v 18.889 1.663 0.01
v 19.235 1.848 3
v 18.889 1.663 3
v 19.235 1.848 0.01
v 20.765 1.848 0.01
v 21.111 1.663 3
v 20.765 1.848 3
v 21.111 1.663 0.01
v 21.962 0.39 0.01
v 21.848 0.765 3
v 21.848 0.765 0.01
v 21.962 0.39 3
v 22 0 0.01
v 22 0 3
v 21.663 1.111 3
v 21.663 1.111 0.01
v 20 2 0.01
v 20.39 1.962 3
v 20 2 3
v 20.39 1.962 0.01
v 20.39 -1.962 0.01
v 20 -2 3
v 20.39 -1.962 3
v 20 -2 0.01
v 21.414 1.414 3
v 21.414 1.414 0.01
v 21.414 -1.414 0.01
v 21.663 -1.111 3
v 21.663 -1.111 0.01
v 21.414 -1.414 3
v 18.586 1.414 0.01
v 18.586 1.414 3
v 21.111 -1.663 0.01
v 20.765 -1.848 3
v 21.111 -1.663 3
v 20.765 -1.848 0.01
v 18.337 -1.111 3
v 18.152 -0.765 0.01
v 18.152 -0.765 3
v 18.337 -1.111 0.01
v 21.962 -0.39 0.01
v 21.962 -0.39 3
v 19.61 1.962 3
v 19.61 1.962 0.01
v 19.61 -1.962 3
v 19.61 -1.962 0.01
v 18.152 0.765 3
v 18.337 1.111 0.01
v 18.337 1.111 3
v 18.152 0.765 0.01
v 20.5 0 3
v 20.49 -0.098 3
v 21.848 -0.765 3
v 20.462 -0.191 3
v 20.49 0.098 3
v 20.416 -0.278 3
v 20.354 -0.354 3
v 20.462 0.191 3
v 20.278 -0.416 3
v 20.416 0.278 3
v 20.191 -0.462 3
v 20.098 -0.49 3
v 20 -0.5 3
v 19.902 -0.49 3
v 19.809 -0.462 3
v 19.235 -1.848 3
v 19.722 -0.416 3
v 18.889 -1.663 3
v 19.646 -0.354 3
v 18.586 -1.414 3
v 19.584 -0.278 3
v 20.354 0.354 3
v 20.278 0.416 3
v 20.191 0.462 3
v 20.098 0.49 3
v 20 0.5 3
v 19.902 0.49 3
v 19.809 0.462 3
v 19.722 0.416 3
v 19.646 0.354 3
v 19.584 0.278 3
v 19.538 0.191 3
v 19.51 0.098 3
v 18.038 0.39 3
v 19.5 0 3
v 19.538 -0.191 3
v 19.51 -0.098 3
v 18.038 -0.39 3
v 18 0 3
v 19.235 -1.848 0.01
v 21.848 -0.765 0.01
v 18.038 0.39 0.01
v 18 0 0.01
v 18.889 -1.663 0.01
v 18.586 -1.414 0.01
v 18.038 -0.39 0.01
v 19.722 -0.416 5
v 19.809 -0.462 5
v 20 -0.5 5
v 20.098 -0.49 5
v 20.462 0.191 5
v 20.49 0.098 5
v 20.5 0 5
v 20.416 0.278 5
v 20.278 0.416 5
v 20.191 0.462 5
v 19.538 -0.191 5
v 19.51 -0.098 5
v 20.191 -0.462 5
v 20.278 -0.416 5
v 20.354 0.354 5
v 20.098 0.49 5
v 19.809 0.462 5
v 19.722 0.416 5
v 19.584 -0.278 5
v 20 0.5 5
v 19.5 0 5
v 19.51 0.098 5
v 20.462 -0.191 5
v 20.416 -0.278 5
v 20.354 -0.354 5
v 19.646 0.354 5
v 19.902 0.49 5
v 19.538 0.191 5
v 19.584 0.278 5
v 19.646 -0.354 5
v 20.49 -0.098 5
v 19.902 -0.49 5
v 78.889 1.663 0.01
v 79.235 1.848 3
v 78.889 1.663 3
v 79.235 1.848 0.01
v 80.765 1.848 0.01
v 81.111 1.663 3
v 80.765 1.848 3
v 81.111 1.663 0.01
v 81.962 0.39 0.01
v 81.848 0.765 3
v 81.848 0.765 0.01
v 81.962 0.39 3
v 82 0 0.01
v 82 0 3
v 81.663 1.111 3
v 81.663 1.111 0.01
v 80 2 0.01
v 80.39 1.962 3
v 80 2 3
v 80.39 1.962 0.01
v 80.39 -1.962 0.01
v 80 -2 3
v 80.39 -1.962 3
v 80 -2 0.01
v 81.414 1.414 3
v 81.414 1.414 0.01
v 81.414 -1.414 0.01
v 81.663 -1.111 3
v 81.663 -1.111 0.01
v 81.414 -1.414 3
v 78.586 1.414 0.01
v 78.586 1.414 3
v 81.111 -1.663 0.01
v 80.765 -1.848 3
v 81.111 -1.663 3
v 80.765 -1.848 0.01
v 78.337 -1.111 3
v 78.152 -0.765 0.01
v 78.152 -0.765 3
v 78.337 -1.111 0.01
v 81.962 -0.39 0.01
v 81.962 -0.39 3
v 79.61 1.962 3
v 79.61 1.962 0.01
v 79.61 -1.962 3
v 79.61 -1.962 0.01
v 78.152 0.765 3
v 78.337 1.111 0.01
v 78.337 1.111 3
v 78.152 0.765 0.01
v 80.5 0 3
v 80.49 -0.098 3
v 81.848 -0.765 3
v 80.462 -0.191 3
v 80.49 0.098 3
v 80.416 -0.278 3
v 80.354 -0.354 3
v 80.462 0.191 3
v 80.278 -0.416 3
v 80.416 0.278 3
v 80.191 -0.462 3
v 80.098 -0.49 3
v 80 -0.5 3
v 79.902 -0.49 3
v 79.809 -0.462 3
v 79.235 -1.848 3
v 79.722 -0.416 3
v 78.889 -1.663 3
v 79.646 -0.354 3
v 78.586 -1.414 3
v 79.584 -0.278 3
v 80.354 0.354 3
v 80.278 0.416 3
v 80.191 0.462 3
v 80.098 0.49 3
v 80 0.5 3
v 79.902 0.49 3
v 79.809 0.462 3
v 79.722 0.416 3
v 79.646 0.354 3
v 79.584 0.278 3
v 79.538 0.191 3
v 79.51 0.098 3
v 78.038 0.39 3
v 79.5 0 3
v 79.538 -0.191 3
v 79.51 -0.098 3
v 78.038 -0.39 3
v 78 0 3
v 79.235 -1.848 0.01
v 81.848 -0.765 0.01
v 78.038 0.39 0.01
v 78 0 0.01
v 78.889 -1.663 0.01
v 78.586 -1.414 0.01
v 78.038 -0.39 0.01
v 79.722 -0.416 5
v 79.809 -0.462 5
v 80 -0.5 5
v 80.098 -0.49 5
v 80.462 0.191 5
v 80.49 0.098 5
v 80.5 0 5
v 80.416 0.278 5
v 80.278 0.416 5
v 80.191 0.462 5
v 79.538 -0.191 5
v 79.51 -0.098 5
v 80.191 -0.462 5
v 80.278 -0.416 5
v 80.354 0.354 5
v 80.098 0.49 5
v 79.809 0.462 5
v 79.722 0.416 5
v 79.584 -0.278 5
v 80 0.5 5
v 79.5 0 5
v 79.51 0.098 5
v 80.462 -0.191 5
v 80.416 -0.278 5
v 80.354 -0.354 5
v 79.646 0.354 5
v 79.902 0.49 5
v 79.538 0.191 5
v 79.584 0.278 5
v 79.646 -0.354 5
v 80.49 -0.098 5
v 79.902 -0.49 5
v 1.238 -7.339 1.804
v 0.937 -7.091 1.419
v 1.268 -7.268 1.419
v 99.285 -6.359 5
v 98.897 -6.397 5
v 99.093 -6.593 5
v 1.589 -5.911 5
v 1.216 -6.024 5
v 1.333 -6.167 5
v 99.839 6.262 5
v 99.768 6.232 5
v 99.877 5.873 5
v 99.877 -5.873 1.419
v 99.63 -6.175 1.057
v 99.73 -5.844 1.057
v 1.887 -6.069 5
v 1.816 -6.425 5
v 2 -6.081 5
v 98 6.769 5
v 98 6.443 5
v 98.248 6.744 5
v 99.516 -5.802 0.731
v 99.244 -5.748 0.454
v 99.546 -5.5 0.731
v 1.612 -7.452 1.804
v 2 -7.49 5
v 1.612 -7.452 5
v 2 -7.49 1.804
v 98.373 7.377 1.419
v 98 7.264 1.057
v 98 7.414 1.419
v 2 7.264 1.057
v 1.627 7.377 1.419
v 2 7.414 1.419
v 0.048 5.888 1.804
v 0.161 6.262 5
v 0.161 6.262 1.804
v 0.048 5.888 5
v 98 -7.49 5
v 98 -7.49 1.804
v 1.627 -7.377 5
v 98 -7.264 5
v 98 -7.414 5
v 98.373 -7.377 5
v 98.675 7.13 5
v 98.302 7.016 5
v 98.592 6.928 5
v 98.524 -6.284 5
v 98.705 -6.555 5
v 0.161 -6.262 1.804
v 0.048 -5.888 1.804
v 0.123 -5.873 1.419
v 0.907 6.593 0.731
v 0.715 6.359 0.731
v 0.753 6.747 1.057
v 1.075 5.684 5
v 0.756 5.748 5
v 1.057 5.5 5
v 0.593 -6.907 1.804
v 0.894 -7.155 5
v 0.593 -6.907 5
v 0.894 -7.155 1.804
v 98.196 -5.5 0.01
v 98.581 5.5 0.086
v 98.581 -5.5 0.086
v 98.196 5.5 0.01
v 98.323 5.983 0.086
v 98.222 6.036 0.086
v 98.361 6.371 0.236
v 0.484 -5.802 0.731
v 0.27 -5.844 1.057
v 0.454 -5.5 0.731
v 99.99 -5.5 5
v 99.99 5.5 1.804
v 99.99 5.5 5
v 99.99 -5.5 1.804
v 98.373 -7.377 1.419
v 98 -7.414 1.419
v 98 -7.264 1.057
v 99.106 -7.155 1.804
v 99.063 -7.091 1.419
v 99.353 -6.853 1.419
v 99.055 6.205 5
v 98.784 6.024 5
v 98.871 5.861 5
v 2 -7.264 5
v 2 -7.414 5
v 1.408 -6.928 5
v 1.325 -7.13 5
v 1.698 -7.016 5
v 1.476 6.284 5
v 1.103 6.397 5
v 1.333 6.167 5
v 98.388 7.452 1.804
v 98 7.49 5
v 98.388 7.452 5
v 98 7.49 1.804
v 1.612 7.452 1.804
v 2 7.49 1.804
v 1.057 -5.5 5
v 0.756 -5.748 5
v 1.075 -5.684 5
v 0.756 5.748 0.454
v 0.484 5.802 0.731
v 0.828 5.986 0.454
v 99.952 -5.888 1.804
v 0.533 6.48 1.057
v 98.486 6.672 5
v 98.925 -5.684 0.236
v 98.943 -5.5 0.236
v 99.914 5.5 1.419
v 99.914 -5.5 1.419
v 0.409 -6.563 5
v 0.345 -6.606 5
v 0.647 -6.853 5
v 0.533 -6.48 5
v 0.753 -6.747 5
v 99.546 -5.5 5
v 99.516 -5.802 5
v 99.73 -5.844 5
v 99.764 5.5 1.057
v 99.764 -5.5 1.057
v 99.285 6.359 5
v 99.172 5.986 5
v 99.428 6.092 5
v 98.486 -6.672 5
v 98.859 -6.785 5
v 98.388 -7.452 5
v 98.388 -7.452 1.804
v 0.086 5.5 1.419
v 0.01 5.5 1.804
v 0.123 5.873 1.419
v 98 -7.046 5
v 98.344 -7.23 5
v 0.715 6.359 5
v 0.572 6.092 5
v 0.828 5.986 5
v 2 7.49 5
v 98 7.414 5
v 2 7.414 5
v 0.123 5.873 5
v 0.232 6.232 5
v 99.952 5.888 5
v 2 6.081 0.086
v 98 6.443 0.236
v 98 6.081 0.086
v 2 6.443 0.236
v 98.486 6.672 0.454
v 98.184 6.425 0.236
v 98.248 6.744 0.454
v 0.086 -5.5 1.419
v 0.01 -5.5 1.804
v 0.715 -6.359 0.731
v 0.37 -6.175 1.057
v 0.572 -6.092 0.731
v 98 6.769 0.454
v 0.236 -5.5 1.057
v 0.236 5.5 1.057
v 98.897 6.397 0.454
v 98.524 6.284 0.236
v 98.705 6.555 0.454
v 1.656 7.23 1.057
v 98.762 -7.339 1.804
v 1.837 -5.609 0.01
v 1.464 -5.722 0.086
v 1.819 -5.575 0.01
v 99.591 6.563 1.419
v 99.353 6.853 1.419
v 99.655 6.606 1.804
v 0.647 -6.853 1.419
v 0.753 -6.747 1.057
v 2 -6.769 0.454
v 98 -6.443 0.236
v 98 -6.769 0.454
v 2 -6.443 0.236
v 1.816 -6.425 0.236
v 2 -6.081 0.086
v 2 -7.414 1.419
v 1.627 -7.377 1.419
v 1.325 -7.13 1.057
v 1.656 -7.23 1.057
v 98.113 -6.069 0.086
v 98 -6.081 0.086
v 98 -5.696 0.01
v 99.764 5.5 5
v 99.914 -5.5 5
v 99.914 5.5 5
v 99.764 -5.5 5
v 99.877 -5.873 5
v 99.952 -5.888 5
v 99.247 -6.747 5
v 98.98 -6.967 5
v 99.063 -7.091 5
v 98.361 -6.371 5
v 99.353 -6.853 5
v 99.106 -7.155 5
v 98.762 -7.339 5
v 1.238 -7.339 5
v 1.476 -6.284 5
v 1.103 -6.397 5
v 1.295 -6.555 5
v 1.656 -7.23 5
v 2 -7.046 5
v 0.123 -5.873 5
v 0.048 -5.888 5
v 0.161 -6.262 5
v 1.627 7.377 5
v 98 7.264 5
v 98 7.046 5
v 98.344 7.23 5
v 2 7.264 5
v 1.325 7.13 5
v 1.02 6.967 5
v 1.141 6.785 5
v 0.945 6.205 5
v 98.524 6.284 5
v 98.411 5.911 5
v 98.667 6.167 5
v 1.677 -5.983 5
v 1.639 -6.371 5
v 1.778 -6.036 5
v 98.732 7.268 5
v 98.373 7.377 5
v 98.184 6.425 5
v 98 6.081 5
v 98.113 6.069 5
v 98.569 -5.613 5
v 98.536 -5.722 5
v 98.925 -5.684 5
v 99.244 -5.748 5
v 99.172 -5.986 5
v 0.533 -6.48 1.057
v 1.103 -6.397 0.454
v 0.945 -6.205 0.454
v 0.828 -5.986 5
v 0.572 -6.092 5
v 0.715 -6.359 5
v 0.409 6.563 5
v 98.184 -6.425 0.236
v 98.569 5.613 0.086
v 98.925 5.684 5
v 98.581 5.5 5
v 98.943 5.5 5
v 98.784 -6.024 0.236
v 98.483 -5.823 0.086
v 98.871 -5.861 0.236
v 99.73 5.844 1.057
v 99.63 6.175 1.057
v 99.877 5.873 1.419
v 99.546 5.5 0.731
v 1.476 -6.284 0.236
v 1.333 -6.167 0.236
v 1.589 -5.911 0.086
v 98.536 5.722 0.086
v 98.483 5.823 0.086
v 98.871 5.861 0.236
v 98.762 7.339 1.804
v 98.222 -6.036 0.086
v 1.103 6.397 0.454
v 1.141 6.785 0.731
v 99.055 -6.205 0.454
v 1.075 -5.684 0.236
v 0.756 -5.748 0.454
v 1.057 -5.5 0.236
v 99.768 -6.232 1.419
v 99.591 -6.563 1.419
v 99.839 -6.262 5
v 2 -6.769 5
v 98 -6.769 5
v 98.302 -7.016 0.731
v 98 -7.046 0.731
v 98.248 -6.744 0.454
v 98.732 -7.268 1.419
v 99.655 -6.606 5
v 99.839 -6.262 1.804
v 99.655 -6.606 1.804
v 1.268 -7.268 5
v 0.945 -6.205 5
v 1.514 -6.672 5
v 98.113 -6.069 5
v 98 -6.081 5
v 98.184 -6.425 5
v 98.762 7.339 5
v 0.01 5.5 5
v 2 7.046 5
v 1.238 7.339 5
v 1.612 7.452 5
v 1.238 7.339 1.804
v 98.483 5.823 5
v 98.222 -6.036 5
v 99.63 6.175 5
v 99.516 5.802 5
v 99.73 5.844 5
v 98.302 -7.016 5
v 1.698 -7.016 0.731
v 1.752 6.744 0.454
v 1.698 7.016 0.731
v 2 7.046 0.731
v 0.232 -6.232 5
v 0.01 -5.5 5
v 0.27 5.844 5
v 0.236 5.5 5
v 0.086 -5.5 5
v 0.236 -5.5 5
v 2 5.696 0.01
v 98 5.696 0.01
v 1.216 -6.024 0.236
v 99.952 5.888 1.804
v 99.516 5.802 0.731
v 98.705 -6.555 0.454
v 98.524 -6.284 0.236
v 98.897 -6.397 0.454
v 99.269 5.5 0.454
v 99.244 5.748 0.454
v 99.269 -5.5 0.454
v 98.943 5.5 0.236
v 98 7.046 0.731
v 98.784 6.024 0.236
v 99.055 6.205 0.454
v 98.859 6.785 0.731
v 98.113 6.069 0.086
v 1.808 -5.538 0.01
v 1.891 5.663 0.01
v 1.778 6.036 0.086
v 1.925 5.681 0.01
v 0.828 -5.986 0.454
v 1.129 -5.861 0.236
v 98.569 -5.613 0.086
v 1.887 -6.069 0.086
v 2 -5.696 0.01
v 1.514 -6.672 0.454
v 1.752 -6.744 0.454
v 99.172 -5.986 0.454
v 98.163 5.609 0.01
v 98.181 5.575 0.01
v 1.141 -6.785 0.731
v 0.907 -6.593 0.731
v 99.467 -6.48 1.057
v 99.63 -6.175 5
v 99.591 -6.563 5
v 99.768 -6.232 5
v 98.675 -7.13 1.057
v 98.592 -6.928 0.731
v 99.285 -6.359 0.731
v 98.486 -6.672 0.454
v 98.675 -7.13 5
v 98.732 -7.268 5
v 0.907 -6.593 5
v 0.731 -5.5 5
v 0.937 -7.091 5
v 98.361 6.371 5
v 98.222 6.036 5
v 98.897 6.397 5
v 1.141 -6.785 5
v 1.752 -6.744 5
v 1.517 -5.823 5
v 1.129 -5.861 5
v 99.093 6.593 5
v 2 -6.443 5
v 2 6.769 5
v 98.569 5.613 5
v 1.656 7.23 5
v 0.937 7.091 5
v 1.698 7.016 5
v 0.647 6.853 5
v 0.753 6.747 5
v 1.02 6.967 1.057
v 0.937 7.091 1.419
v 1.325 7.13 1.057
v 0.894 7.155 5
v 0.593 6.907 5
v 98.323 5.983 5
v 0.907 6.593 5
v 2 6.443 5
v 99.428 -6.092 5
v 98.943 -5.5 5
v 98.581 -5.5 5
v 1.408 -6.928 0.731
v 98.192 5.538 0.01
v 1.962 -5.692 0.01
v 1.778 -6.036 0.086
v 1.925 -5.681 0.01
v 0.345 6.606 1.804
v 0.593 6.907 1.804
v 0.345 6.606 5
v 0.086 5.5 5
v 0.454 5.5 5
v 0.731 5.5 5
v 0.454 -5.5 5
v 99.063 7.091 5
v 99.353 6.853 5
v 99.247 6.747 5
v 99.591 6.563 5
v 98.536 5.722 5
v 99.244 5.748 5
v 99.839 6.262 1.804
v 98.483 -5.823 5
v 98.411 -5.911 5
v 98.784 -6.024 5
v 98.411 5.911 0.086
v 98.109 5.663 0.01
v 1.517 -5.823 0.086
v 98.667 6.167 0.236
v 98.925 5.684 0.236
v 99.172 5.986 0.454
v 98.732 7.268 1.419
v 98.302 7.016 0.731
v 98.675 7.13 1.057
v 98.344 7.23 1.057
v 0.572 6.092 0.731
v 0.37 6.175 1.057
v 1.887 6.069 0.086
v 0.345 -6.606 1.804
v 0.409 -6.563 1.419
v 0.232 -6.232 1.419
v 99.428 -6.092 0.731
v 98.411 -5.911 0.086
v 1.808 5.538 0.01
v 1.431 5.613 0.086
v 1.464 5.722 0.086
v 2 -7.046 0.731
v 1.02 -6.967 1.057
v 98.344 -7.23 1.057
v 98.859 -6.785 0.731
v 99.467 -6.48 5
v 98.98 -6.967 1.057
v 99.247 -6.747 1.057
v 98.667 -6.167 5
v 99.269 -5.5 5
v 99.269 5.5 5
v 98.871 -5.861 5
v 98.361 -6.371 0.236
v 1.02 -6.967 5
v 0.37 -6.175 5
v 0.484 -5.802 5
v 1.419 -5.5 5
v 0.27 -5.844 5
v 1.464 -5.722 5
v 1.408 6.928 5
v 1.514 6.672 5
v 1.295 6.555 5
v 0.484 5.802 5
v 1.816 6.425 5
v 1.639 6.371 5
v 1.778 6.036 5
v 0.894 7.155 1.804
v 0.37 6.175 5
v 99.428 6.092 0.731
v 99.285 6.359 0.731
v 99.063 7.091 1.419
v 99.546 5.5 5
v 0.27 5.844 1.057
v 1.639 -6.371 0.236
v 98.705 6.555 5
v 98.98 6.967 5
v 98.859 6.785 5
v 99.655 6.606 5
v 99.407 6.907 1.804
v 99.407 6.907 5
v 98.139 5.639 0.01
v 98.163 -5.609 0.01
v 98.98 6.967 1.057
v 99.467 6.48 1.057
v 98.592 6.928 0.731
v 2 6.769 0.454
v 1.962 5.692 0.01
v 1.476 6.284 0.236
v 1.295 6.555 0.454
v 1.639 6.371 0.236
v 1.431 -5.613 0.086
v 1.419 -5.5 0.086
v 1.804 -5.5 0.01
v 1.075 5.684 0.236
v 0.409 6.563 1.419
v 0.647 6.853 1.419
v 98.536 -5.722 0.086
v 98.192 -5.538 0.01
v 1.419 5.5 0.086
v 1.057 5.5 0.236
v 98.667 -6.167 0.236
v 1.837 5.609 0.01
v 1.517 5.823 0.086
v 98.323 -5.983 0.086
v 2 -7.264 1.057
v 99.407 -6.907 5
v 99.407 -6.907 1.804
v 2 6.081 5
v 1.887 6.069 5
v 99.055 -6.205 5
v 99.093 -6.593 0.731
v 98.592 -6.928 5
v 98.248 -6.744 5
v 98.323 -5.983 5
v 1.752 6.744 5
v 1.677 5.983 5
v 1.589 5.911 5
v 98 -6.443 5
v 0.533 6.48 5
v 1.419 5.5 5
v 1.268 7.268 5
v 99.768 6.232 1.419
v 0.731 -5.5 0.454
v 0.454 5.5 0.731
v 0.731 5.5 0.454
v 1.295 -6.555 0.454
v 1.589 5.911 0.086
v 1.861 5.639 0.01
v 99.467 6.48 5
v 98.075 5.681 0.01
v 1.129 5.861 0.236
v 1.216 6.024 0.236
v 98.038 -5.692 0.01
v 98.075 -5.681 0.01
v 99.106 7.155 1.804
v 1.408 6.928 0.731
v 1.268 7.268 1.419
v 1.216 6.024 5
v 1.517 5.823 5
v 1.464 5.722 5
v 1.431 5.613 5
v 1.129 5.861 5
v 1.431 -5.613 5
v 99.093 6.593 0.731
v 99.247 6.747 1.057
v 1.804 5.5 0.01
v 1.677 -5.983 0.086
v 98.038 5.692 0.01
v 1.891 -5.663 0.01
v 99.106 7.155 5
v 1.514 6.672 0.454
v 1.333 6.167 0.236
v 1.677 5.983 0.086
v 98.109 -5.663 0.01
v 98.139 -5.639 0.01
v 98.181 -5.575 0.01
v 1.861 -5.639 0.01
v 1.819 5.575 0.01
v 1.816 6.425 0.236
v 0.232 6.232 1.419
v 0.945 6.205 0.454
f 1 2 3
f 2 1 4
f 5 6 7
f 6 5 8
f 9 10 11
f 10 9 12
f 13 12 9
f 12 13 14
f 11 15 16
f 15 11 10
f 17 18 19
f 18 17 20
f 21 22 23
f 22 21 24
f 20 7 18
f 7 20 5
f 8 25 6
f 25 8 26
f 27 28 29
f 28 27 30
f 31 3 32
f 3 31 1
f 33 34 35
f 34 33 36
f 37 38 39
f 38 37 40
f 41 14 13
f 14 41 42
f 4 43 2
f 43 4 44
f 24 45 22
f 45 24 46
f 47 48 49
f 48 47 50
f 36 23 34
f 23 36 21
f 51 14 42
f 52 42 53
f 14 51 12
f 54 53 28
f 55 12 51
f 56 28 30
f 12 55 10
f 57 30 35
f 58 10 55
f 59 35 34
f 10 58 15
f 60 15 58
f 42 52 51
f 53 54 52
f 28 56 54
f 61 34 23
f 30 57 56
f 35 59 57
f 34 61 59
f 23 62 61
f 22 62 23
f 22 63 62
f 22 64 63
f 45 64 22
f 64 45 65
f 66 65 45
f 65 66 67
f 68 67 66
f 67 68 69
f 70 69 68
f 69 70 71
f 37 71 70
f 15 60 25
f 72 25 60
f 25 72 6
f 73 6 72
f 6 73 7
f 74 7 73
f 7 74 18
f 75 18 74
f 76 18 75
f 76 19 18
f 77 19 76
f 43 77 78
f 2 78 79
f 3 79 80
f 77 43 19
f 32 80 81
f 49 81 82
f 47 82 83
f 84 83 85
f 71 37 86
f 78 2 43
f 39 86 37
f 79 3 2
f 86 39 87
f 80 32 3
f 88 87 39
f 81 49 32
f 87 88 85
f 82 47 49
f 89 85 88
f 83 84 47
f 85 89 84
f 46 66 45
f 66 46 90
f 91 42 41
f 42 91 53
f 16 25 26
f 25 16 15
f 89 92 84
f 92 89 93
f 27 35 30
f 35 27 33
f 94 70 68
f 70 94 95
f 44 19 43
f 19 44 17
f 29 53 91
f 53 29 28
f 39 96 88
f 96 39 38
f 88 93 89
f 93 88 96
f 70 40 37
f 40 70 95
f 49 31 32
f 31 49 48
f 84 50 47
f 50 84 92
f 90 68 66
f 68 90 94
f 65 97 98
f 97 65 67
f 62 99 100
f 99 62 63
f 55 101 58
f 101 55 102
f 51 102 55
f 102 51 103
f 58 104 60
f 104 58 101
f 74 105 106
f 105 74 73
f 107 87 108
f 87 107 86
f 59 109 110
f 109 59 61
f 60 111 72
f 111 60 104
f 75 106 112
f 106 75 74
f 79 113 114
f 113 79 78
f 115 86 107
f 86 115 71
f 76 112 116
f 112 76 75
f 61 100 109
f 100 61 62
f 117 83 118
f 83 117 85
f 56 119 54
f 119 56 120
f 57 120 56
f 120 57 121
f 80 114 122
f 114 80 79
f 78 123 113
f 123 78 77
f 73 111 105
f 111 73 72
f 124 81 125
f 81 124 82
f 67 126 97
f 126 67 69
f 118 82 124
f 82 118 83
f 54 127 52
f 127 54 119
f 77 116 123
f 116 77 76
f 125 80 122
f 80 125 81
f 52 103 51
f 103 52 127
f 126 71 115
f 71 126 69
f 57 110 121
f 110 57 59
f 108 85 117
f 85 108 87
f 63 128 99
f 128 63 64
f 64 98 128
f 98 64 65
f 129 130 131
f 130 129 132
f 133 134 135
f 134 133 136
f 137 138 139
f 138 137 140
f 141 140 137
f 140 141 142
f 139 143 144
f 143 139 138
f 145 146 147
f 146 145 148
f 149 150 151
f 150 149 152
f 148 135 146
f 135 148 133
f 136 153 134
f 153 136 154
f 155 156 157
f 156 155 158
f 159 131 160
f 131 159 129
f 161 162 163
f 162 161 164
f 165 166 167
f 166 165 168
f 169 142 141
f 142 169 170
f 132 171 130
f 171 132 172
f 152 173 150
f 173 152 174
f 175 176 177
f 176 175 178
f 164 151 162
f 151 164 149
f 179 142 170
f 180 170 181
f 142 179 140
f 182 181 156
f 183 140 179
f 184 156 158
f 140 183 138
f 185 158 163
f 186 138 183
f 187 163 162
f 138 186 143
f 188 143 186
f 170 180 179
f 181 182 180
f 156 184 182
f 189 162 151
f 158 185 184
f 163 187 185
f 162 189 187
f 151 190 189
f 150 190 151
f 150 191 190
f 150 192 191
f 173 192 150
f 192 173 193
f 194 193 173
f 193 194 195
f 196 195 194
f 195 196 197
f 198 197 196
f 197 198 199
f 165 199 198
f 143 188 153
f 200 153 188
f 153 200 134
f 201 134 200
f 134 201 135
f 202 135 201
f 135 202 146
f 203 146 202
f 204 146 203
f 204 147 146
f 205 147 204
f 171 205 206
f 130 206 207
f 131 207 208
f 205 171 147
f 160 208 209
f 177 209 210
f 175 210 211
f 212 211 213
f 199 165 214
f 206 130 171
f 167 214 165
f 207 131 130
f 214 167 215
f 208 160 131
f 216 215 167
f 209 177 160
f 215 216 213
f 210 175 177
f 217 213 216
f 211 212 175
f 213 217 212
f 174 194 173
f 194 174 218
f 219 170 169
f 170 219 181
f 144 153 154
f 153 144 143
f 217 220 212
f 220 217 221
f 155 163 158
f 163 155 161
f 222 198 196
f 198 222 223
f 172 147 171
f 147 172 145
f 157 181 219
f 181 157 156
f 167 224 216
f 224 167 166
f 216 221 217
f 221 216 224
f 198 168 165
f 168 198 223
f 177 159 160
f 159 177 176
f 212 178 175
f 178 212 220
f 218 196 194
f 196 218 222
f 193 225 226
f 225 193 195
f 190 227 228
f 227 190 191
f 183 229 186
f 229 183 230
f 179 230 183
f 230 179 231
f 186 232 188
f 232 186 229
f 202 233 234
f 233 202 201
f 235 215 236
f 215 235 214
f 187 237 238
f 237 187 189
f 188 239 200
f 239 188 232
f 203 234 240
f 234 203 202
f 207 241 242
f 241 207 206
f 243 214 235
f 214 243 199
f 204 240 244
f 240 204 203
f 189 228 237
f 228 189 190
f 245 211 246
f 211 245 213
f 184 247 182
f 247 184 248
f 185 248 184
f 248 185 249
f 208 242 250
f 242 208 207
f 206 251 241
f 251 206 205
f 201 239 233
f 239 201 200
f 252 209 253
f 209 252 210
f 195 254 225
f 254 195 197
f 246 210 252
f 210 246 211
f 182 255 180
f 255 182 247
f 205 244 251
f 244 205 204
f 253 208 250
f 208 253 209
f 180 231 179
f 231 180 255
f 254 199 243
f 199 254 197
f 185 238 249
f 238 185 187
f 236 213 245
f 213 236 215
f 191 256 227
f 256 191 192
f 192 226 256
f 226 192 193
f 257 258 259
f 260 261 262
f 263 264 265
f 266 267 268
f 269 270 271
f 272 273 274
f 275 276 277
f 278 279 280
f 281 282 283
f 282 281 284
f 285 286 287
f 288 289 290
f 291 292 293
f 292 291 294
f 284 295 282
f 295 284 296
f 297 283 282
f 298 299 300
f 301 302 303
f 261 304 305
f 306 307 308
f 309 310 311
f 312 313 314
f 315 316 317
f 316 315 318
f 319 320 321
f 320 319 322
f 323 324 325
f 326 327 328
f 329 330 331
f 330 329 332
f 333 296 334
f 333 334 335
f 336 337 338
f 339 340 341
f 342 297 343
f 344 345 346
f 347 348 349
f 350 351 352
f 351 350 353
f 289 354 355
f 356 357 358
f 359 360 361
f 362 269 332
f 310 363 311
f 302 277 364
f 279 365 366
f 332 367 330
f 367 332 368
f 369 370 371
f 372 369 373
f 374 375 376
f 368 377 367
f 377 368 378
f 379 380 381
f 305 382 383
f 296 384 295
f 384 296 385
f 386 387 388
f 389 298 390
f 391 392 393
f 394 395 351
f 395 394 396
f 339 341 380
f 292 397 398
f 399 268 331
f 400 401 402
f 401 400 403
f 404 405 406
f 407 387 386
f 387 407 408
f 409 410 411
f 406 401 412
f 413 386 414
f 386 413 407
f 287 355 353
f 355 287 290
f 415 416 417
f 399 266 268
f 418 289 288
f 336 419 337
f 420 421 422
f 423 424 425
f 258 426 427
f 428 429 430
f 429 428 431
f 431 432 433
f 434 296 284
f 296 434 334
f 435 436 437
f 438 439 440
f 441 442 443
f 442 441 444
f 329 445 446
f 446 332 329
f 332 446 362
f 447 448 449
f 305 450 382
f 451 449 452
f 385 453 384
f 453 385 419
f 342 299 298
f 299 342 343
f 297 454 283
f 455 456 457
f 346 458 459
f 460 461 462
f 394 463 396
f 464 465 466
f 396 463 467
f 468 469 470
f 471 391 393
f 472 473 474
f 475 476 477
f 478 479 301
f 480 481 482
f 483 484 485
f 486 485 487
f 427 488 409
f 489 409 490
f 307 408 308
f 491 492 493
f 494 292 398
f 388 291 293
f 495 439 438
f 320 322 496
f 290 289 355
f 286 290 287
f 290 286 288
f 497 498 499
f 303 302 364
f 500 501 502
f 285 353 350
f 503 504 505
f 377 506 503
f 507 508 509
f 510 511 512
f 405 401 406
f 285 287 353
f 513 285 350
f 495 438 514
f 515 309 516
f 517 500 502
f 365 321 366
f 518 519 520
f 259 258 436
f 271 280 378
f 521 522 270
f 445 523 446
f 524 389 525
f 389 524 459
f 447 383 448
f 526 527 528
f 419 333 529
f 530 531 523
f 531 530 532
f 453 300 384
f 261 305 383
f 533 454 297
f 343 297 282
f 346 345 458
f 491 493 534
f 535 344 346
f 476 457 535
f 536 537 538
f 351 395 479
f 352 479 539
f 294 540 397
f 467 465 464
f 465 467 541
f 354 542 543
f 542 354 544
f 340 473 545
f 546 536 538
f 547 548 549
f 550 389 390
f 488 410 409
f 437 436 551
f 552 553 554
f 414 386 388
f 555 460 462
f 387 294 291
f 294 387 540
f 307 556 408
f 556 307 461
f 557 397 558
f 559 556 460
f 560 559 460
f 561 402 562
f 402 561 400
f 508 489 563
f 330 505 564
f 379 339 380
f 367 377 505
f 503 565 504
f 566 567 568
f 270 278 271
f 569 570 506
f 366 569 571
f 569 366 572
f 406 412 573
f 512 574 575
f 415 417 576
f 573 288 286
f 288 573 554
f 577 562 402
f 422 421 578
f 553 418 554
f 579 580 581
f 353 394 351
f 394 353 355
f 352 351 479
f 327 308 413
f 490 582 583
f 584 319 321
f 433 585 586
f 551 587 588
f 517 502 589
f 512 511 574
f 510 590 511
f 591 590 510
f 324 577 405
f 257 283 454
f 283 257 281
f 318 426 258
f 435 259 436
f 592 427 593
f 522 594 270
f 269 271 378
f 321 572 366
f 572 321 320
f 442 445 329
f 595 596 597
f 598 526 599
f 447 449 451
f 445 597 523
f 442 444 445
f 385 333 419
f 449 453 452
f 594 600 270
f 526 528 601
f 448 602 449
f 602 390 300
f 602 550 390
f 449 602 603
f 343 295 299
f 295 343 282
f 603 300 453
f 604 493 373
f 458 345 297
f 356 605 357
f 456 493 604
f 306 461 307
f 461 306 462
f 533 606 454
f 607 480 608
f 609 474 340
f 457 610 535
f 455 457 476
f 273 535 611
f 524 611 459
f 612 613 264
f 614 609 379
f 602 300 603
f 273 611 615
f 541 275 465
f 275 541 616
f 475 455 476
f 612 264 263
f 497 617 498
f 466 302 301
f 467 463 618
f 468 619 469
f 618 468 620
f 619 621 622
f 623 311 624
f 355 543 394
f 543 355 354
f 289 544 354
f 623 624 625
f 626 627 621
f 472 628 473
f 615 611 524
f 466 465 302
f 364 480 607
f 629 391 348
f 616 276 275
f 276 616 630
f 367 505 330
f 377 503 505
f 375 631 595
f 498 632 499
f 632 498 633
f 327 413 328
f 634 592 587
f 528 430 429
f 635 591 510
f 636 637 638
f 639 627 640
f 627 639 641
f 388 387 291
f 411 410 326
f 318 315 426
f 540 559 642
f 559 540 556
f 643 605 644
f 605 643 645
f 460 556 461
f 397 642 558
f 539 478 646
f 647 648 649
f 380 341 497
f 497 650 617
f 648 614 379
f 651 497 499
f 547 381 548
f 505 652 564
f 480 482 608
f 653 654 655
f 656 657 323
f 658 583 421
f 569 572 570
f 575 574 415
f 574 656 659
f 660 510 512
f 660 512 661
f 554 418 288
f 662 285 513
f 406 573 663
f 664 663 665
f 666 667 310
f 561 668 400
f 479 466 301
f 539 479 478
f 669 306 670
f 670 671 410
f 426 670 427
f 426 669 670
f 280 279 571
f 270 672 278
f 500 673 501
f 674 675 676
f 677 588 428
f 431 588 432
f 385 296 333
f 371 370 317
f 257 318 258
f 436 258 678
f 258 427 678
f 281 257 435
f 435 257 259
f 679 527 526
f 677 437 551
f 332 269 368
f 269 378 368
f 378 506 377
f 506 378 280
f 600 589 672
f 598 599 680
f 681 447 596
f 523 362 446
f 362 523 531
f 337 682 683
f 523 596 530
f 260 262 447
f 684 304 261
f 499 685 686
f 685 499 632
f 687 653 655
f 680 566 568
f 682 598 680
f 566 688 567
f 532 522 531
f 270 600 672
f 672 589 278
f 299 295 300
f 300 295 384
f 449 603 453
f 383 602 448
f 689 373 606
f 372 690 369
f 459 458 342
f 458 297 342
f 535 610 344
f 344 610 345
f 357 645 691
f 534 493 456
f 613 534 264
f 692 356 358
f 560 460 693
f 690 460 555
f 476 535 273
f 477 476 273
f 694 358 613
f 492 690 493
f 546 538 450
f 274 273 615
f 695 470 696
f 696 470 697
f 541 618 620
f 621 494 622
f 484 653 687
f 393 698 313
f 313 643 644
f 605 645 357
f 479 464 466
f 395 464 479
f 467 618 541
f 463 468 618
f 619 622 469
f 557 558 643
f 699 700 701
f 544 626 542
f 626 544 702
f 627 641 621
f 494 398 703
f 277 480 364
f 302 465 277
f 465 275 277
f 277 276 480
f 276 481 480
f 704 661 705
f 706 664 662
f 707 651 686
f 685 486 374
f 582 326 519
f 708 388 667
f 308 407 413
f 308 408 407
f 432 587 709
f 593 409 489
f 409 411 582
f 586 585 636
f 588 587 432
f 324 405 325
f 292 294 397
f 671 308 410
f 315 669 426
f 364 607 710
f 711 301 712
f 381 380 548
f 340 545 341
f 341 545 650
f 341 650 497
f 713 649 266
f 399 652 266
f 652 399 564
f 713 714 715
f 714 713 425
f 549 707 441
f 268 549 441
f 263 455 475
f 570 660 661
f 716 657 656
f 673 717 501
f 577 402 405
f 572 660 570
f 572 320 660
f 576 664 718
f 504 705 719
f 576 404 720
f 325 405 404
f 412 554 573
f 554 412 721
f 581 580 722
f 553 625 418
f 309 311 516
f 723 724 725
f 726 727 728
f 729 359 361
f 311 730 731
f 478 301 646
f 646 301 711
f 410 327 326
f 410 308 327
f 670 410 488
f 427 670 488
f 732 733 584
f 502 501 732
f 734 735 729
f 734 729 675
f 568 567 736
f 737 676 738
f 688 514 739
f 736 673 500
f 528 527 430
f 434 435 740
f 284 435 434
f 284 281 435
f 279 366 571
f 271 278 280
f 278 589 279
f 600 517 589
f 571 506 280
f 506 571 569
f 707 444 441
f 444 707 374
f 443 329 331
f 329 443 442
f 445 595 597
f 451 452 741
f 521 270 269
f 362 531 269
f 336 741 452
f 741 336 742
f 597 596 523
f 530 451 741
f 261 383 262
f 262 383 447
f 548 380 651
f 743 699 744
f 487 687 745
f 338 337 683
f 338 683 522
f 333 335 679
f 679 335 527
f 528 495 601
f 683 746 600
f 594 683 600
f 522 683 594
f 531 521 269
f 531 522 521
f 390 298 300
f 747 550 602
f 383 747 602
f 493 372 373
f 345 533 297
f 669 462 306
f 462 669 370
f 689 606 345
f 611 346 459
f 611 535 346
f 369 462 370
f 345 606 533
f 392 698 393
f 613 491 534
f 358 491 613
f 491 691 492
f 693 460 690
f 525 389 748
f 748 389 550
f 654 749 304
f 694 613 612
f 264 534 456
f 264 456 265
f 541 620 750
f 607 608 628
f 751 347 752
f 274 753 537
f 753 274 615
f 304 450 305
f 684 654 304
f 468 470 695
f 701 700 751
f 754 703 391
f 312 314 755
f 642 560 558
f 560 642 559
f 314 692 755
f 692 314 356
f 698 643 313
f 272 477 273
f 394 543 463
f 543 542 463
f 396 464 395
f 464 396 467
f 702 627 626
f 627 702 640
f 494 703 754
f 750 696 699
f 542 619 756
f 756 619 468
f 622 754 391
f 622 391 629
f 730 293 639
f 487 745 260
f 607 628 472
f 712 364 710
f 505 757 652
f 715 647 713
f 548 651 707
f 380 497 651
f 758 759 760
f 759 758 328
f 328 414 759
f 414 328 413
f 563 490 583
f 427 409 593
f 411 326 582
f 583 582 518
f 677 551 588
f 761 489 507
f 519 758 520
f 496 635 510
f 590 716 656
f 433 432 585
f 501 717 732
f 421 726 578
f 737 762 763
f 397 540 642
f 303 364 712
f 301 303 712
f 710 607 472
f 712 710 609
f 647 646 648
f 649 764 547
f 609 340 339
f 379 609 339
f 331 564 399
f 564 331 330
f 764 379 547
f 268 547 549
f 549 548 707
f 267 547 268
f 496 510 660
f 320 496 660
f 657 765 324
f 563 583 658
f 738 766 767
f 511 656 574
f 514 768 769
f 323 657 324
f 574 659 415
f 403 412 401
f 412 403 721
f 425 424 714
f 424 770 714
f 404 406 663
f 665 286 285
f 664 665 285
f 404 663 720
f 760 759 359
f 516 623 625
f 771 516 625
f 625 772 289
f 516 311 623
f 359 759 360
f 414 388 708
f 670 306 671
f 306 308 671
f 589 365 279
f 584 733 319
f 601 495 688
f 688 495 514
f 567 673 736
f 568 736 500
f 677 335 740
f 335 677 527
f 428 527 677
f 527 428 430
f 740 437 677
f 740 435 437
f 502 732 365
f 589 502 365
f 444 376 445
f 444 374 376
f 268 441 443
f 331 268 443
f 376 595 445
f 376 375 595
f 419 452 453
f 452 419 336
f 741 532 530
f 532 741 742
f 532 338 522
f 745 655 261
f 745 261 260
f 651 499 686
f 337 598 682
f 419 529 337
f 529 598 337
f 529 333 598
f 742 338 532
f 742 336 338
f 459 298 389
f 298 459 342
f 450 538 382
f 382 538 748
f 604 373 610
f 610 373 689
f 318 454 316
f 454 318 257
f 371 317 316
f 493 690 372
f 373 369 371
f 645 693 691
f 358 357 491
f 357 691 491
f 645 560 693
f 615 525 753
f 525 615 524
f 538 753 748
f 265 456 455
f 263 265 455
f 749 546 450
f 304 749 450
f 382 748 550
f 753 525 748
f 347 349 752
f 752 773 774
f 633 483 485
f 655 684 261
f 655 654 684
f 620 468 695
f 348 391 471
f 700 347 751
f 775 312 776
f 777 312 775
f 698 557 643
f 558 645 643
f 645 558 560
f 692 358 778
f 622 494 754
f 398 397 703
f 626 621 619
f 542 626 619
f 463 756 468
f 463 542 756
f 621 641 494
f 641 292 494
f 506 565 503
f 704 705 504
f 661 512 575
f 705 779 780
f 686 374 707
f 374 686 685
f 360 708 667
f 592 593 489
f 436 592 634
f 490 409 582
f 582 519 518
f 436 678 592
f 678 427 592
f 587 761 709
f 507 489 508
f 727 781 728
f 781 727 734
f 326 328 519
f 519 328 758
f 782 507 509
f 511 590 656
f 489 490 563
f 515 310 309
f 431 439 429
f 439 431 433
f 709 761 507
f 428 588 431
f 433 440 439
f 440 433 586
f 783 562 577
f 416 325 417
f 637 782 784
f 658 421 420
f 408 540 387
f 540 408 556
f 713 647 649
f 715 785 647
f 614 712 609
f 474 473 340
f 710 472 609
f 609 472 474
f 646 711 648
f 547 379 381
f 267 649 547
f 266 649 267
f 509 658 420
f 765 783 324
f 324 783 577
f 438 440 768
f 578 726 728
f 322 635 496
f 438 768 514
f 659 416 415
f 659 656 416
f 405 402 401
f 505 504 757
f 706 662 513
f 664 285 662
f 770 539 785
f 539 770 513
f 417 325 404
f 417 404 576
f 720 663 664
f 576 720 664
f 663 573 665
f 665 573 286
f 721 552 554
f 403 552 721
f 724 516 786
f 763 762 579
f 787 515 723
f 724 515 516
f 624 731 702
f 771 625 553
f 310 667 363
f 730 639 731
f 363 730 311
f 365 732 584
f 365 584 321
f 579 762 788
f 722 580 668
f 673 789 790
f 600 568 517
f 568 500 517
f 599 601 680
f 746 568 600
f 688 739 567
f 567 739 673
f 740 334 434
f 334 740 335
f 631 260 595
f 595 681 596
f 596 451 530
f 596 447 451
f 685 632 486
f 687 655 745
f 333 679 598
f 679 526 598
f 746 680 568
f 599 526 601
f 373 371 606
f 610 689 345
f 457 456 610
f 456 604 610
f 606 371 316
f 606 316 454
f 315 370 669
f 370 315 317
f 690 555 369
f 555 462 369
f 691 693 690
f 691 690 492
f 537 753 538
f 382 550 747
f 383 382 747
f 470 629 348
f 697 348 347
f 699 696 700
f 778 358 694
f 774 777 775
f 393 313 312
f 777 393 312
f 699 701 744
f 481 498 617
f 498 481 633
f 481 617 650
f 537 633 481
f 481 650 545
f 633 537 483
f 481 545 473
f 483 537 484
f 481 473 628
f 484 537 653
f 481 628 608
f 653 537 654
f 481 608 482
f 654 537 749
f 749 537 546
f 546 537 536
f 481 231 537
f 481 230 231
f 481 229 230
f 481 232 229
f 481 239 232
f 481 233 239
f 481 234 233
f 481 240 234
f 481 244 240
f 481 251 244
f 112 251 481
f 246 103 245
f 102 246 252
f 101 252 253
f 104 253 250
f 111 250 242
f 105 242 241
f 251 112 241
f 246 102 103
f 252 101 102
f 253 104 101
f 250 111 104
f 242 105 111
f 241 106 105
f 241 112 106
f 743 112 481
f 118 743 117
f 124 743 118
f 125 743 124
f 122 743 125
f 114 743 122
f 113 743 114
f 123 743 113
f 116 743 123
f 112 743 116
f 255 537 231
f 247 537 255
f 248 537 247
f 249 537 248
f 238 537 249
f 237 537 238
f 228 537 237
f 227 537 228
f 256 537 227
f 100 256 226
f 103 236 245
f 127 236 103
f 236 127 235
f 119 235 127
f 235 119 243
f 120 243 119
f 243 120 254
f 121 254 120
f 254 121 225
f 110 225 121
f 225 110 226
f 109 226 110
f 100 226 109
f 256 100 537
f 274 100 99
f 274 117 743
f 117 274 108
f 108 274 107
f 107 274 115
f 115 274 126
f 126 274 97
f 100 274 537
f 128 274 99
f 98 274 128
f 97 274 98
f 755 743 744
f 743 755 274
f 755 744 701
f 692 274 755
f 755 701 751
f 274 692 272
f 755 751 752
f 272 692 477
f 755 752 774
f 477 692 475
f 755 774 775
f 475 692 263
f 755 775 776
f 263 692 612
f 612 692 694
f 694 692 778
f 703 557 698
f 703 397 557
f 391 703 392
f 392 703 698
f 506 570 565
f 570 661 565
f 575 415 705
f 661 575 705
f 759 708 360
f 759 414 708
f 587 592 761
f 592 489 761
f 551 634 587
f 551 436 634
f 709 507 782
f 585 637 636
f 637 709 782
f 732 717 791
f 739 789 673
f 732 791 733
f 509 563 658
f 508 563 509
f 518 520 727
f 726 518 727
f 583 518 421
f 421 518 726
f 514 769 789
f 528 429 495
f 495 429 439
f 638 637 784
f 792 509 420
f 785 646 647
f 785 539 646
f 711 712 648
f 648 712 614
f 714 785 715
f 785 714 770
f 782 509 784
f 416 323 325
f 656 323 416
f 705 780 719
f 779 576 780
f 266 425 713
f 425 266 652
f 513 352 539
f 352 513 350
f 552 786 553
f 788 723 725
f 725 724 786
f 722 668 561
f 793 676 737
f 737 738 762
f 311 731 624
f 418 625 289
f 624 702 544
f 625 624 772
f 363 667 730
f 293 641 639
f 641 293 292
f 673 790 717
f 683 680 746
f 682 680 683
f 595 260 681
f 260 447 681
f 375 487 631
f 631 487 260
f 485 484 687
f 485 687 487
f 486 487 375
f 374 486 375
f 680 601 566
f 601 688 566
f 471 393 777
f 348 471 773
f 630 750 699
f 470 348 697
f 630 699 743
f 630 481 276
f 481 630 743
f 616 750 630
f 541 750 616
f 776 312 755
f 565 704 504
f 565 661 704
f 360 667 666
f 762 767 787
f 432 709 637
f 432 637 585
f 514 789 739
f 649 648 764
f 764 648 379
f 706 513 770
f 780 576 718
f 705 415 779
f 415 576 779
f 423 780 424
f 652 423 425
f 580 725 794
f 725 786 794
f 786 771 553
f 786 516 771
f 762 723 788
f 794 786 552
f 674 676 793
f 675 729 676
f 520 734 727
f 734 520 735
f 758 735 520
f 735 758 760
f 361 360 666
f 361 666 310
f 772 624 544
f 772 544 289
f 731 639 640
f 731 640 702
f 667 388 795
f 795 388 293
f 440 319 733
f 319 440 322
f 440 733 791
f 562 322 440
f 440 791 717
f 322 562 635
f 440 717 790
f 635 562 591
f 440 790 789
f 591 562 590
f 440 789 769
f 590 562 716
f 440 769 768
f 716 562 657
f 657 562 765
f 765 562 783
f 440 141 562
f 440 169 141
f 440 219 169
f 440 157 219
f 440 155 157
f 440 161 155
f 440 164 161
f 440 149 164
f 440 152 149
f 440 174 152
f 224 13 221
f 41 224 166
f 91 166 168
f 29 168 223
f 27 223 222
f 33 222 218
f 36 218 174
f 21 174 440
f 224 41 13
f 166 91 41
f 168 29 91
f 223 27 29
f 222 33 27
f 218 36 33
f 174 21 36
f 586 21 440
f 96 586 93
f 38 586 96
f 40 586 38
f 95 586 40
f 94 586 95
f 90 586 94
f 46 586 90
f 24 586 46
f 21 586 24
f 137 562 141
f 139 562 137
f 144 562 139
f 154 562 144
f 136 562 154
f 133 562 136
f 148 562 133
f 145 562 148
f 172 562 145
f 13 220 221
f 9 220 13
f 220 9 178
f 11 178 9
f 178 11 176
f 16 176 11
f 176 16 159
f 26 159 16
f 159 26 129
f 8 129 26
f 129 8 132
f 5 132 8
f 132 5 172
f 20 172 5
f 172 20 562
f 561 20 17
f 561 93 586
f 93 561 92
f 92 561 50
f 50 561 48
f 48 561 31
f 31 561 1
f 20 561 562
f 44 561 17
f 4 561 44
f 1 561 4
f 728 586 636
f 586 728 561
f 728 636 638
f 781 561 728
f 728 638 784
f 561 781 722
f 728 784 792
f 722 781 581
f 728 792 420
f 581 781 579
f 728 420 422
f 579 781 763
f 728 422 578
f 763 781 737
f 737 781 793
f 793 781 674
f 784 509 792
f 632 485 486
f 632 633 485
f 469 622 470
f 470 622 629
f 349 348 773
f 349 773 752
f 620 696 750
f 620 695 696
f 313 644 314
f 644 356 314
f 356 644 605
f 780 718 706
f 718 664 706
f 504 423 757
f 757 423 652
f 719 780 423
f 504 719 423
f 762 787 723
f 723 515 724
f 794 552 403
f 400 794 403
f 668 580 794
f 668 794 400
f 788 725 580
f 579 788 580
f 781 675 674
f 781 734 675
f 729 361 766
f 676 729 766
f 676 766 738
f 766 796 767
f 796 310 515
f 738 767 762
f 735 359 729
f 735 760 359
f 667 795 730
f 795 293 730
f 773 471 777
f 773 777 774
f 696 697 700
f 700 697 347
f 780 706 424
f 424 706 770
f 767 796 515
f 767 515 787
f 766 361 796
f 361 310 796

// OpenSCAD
$fn=32;

cube=[100,15,5];
nails=[20,80];

nail=1;
nailHead=4;
nailPad=2;

f=2;

///////////////////////////////

difference(){
	cubeRounded(cube,r=[f,f,f],r4=[f,f,0],r5=[f,f,0],r6=[f,f,0],r7=[f,f,0],center=[0,1,0]);
	
	for(x=nails) t([x,0,0]){
		t([0,0,-nailPad]) cylinder(d=nailHead,h=cube.z);
		cylinder(d=nail,h=2*cube.z);
	}
}

///////////////////////////////

///////////////////////////////

module cubeRounded(	
	size=[3,3,3],
	r=[0,0,0],
	r0=[-1,-1,-1],
	r1=[-1,-1,-1],
	r2=[-1,-1,-1],
	r3=[-1,-1,-1],
	r4=[-1,-1,-1],
	r5=[-1,-1,-1],
	r6=[-1,-1,-1],
	r7=[-1,-1,-1],
	chamfer=[0,0,0,0],
	chamferAngle=60,
	center=[0,0,0],
	not=0.00001
){
	module halfTriangle3D(angle=45,h=10,z=10){
		linear_extrude(z) halfTriangle(angle,h);
	}

	module halfTriangle(angle=45,h=10){
		r=angle;
		base=h*tan(r);
		sidex=2.1*base*cos(r);
		sidey=h/cos(r)+base;
		
		intersection(){
			tr([base,0,0],[0,0,r]) t([-sidex,0,0]) square([sidex,sidey]);
			square([2.2*base,1.1*h]);
		}
	}
	
	function sat3(a) = [max(not,a.x),max(not,a.y),max(not,a.z)];
	function chg(a, b) = (a.x==-1 && a.y==-1 && a.z==-1) ? b : a;

	_r0 = sat3(chg(r0, r));
	_r1 = sat3(chg(r1, r));
	_r2 = sat3(chg(r2, r));
	_r3 = sat3(chg(r3, r));
	_r4 = sat3(chg(r4, r));
	_r5 = sat3(chg(r5, r));
	_r6 = sat3(chg(r6, r));
	_r7 = sat3(chg(r7, r));
	
	module cubeR(){
		hull(){
			t(_r0) scale(_r0) intersection(){
				sphere(1);
				mirror([1,0,0]) mirror([0,1,1]) cube(1);
			}
			
			t([size.x-_r1.x,_r1.y,_r1.z]) scale(_r1) intersection(){
				sphere(1);
				mirror([0,1,1]) cube(1);
			}
			
			t([_r2.x,size.y-_r2.y,_r2.z]) scale(_r2) intersection(){
				sphere(1);
				mirror([1,0,1]) cube(1);
			}
			
			t([size.x-_r3.x,size.y-_r3.y,_r3.z]) scale(_r3) intersection(){
				sphere(1);
				mirror([0,0,1]) cube(1);
			}

			t([_r4.x,_r4.y,size.z-_r4.z]) scale(_r4) intersection(){
				sphere(1);
				mirror([1,1,0]) cube(1);
			}
			
			t([size.x-_r5.x,_r5.y,size.z-_r5.z]) scale(_r5) intersection(){
				sphere(1);
				mirror([0,1,0]) cube(1);
			}

			t([_r6.x,size.y-_r6.y,size.z-_r6.z]) scale(_r6) intersection(){
				sphere(1);
				mirror([1,0,0]) cube(1);
			}
			
			t([size.x-_r7.x,size.y-_r7.y,size.z-_r7.z]) scale(_r7) intersection(){
				sphere(1);
				mirror([0,0,0]) cube(1);
			}
		}
		
		//chamfering
		if(chamfer[0]) r([0,90,0]) halfTriangle3D(90-chamferAngle,size.y/(chamfer[2]+1),size.x);
			
		if(chamfer[2]) tr([0,size.y,0],[0,90,0]) mirror([0,1,0]) halfTriangle3D(90-chamferAngle,size.y/(chamfer[0]+1),size.x);

		if(chamfer[1]) tr([0,size.y,0],[90,90,0]) halfTriangle3D(90-chamferAngle,size.x/(chamfer[3]+1),size.y);

		if(chamfer[3]) tr([size.x,size.y,0],[90,90,0]) mirror([0,1,0]) halfTriangle3D(90-chamferAngle,size.x/(chamfer[1]+1),size.y);
	}
	
	t([-size.x/2*center.x,-size.y/2*center.y,-size.z/2*center.z]) cubeR();
}

module t(v=[0,0,0]){translate(v) children();}
module r(a=[0,0,0],rp=[0,0,0]){translate(rp) rotate(a) translate(-rp) children();}
module tr(v=[0,0,0],a=[0,0,0],rp=[0,0,0]){t(v) r(a,rp) children();}
module rt(a=[0,0,0],rp=[0,0,0],v=[0,0,0]){r(a,rp) t(v) children();}
module u(){union() children();}
